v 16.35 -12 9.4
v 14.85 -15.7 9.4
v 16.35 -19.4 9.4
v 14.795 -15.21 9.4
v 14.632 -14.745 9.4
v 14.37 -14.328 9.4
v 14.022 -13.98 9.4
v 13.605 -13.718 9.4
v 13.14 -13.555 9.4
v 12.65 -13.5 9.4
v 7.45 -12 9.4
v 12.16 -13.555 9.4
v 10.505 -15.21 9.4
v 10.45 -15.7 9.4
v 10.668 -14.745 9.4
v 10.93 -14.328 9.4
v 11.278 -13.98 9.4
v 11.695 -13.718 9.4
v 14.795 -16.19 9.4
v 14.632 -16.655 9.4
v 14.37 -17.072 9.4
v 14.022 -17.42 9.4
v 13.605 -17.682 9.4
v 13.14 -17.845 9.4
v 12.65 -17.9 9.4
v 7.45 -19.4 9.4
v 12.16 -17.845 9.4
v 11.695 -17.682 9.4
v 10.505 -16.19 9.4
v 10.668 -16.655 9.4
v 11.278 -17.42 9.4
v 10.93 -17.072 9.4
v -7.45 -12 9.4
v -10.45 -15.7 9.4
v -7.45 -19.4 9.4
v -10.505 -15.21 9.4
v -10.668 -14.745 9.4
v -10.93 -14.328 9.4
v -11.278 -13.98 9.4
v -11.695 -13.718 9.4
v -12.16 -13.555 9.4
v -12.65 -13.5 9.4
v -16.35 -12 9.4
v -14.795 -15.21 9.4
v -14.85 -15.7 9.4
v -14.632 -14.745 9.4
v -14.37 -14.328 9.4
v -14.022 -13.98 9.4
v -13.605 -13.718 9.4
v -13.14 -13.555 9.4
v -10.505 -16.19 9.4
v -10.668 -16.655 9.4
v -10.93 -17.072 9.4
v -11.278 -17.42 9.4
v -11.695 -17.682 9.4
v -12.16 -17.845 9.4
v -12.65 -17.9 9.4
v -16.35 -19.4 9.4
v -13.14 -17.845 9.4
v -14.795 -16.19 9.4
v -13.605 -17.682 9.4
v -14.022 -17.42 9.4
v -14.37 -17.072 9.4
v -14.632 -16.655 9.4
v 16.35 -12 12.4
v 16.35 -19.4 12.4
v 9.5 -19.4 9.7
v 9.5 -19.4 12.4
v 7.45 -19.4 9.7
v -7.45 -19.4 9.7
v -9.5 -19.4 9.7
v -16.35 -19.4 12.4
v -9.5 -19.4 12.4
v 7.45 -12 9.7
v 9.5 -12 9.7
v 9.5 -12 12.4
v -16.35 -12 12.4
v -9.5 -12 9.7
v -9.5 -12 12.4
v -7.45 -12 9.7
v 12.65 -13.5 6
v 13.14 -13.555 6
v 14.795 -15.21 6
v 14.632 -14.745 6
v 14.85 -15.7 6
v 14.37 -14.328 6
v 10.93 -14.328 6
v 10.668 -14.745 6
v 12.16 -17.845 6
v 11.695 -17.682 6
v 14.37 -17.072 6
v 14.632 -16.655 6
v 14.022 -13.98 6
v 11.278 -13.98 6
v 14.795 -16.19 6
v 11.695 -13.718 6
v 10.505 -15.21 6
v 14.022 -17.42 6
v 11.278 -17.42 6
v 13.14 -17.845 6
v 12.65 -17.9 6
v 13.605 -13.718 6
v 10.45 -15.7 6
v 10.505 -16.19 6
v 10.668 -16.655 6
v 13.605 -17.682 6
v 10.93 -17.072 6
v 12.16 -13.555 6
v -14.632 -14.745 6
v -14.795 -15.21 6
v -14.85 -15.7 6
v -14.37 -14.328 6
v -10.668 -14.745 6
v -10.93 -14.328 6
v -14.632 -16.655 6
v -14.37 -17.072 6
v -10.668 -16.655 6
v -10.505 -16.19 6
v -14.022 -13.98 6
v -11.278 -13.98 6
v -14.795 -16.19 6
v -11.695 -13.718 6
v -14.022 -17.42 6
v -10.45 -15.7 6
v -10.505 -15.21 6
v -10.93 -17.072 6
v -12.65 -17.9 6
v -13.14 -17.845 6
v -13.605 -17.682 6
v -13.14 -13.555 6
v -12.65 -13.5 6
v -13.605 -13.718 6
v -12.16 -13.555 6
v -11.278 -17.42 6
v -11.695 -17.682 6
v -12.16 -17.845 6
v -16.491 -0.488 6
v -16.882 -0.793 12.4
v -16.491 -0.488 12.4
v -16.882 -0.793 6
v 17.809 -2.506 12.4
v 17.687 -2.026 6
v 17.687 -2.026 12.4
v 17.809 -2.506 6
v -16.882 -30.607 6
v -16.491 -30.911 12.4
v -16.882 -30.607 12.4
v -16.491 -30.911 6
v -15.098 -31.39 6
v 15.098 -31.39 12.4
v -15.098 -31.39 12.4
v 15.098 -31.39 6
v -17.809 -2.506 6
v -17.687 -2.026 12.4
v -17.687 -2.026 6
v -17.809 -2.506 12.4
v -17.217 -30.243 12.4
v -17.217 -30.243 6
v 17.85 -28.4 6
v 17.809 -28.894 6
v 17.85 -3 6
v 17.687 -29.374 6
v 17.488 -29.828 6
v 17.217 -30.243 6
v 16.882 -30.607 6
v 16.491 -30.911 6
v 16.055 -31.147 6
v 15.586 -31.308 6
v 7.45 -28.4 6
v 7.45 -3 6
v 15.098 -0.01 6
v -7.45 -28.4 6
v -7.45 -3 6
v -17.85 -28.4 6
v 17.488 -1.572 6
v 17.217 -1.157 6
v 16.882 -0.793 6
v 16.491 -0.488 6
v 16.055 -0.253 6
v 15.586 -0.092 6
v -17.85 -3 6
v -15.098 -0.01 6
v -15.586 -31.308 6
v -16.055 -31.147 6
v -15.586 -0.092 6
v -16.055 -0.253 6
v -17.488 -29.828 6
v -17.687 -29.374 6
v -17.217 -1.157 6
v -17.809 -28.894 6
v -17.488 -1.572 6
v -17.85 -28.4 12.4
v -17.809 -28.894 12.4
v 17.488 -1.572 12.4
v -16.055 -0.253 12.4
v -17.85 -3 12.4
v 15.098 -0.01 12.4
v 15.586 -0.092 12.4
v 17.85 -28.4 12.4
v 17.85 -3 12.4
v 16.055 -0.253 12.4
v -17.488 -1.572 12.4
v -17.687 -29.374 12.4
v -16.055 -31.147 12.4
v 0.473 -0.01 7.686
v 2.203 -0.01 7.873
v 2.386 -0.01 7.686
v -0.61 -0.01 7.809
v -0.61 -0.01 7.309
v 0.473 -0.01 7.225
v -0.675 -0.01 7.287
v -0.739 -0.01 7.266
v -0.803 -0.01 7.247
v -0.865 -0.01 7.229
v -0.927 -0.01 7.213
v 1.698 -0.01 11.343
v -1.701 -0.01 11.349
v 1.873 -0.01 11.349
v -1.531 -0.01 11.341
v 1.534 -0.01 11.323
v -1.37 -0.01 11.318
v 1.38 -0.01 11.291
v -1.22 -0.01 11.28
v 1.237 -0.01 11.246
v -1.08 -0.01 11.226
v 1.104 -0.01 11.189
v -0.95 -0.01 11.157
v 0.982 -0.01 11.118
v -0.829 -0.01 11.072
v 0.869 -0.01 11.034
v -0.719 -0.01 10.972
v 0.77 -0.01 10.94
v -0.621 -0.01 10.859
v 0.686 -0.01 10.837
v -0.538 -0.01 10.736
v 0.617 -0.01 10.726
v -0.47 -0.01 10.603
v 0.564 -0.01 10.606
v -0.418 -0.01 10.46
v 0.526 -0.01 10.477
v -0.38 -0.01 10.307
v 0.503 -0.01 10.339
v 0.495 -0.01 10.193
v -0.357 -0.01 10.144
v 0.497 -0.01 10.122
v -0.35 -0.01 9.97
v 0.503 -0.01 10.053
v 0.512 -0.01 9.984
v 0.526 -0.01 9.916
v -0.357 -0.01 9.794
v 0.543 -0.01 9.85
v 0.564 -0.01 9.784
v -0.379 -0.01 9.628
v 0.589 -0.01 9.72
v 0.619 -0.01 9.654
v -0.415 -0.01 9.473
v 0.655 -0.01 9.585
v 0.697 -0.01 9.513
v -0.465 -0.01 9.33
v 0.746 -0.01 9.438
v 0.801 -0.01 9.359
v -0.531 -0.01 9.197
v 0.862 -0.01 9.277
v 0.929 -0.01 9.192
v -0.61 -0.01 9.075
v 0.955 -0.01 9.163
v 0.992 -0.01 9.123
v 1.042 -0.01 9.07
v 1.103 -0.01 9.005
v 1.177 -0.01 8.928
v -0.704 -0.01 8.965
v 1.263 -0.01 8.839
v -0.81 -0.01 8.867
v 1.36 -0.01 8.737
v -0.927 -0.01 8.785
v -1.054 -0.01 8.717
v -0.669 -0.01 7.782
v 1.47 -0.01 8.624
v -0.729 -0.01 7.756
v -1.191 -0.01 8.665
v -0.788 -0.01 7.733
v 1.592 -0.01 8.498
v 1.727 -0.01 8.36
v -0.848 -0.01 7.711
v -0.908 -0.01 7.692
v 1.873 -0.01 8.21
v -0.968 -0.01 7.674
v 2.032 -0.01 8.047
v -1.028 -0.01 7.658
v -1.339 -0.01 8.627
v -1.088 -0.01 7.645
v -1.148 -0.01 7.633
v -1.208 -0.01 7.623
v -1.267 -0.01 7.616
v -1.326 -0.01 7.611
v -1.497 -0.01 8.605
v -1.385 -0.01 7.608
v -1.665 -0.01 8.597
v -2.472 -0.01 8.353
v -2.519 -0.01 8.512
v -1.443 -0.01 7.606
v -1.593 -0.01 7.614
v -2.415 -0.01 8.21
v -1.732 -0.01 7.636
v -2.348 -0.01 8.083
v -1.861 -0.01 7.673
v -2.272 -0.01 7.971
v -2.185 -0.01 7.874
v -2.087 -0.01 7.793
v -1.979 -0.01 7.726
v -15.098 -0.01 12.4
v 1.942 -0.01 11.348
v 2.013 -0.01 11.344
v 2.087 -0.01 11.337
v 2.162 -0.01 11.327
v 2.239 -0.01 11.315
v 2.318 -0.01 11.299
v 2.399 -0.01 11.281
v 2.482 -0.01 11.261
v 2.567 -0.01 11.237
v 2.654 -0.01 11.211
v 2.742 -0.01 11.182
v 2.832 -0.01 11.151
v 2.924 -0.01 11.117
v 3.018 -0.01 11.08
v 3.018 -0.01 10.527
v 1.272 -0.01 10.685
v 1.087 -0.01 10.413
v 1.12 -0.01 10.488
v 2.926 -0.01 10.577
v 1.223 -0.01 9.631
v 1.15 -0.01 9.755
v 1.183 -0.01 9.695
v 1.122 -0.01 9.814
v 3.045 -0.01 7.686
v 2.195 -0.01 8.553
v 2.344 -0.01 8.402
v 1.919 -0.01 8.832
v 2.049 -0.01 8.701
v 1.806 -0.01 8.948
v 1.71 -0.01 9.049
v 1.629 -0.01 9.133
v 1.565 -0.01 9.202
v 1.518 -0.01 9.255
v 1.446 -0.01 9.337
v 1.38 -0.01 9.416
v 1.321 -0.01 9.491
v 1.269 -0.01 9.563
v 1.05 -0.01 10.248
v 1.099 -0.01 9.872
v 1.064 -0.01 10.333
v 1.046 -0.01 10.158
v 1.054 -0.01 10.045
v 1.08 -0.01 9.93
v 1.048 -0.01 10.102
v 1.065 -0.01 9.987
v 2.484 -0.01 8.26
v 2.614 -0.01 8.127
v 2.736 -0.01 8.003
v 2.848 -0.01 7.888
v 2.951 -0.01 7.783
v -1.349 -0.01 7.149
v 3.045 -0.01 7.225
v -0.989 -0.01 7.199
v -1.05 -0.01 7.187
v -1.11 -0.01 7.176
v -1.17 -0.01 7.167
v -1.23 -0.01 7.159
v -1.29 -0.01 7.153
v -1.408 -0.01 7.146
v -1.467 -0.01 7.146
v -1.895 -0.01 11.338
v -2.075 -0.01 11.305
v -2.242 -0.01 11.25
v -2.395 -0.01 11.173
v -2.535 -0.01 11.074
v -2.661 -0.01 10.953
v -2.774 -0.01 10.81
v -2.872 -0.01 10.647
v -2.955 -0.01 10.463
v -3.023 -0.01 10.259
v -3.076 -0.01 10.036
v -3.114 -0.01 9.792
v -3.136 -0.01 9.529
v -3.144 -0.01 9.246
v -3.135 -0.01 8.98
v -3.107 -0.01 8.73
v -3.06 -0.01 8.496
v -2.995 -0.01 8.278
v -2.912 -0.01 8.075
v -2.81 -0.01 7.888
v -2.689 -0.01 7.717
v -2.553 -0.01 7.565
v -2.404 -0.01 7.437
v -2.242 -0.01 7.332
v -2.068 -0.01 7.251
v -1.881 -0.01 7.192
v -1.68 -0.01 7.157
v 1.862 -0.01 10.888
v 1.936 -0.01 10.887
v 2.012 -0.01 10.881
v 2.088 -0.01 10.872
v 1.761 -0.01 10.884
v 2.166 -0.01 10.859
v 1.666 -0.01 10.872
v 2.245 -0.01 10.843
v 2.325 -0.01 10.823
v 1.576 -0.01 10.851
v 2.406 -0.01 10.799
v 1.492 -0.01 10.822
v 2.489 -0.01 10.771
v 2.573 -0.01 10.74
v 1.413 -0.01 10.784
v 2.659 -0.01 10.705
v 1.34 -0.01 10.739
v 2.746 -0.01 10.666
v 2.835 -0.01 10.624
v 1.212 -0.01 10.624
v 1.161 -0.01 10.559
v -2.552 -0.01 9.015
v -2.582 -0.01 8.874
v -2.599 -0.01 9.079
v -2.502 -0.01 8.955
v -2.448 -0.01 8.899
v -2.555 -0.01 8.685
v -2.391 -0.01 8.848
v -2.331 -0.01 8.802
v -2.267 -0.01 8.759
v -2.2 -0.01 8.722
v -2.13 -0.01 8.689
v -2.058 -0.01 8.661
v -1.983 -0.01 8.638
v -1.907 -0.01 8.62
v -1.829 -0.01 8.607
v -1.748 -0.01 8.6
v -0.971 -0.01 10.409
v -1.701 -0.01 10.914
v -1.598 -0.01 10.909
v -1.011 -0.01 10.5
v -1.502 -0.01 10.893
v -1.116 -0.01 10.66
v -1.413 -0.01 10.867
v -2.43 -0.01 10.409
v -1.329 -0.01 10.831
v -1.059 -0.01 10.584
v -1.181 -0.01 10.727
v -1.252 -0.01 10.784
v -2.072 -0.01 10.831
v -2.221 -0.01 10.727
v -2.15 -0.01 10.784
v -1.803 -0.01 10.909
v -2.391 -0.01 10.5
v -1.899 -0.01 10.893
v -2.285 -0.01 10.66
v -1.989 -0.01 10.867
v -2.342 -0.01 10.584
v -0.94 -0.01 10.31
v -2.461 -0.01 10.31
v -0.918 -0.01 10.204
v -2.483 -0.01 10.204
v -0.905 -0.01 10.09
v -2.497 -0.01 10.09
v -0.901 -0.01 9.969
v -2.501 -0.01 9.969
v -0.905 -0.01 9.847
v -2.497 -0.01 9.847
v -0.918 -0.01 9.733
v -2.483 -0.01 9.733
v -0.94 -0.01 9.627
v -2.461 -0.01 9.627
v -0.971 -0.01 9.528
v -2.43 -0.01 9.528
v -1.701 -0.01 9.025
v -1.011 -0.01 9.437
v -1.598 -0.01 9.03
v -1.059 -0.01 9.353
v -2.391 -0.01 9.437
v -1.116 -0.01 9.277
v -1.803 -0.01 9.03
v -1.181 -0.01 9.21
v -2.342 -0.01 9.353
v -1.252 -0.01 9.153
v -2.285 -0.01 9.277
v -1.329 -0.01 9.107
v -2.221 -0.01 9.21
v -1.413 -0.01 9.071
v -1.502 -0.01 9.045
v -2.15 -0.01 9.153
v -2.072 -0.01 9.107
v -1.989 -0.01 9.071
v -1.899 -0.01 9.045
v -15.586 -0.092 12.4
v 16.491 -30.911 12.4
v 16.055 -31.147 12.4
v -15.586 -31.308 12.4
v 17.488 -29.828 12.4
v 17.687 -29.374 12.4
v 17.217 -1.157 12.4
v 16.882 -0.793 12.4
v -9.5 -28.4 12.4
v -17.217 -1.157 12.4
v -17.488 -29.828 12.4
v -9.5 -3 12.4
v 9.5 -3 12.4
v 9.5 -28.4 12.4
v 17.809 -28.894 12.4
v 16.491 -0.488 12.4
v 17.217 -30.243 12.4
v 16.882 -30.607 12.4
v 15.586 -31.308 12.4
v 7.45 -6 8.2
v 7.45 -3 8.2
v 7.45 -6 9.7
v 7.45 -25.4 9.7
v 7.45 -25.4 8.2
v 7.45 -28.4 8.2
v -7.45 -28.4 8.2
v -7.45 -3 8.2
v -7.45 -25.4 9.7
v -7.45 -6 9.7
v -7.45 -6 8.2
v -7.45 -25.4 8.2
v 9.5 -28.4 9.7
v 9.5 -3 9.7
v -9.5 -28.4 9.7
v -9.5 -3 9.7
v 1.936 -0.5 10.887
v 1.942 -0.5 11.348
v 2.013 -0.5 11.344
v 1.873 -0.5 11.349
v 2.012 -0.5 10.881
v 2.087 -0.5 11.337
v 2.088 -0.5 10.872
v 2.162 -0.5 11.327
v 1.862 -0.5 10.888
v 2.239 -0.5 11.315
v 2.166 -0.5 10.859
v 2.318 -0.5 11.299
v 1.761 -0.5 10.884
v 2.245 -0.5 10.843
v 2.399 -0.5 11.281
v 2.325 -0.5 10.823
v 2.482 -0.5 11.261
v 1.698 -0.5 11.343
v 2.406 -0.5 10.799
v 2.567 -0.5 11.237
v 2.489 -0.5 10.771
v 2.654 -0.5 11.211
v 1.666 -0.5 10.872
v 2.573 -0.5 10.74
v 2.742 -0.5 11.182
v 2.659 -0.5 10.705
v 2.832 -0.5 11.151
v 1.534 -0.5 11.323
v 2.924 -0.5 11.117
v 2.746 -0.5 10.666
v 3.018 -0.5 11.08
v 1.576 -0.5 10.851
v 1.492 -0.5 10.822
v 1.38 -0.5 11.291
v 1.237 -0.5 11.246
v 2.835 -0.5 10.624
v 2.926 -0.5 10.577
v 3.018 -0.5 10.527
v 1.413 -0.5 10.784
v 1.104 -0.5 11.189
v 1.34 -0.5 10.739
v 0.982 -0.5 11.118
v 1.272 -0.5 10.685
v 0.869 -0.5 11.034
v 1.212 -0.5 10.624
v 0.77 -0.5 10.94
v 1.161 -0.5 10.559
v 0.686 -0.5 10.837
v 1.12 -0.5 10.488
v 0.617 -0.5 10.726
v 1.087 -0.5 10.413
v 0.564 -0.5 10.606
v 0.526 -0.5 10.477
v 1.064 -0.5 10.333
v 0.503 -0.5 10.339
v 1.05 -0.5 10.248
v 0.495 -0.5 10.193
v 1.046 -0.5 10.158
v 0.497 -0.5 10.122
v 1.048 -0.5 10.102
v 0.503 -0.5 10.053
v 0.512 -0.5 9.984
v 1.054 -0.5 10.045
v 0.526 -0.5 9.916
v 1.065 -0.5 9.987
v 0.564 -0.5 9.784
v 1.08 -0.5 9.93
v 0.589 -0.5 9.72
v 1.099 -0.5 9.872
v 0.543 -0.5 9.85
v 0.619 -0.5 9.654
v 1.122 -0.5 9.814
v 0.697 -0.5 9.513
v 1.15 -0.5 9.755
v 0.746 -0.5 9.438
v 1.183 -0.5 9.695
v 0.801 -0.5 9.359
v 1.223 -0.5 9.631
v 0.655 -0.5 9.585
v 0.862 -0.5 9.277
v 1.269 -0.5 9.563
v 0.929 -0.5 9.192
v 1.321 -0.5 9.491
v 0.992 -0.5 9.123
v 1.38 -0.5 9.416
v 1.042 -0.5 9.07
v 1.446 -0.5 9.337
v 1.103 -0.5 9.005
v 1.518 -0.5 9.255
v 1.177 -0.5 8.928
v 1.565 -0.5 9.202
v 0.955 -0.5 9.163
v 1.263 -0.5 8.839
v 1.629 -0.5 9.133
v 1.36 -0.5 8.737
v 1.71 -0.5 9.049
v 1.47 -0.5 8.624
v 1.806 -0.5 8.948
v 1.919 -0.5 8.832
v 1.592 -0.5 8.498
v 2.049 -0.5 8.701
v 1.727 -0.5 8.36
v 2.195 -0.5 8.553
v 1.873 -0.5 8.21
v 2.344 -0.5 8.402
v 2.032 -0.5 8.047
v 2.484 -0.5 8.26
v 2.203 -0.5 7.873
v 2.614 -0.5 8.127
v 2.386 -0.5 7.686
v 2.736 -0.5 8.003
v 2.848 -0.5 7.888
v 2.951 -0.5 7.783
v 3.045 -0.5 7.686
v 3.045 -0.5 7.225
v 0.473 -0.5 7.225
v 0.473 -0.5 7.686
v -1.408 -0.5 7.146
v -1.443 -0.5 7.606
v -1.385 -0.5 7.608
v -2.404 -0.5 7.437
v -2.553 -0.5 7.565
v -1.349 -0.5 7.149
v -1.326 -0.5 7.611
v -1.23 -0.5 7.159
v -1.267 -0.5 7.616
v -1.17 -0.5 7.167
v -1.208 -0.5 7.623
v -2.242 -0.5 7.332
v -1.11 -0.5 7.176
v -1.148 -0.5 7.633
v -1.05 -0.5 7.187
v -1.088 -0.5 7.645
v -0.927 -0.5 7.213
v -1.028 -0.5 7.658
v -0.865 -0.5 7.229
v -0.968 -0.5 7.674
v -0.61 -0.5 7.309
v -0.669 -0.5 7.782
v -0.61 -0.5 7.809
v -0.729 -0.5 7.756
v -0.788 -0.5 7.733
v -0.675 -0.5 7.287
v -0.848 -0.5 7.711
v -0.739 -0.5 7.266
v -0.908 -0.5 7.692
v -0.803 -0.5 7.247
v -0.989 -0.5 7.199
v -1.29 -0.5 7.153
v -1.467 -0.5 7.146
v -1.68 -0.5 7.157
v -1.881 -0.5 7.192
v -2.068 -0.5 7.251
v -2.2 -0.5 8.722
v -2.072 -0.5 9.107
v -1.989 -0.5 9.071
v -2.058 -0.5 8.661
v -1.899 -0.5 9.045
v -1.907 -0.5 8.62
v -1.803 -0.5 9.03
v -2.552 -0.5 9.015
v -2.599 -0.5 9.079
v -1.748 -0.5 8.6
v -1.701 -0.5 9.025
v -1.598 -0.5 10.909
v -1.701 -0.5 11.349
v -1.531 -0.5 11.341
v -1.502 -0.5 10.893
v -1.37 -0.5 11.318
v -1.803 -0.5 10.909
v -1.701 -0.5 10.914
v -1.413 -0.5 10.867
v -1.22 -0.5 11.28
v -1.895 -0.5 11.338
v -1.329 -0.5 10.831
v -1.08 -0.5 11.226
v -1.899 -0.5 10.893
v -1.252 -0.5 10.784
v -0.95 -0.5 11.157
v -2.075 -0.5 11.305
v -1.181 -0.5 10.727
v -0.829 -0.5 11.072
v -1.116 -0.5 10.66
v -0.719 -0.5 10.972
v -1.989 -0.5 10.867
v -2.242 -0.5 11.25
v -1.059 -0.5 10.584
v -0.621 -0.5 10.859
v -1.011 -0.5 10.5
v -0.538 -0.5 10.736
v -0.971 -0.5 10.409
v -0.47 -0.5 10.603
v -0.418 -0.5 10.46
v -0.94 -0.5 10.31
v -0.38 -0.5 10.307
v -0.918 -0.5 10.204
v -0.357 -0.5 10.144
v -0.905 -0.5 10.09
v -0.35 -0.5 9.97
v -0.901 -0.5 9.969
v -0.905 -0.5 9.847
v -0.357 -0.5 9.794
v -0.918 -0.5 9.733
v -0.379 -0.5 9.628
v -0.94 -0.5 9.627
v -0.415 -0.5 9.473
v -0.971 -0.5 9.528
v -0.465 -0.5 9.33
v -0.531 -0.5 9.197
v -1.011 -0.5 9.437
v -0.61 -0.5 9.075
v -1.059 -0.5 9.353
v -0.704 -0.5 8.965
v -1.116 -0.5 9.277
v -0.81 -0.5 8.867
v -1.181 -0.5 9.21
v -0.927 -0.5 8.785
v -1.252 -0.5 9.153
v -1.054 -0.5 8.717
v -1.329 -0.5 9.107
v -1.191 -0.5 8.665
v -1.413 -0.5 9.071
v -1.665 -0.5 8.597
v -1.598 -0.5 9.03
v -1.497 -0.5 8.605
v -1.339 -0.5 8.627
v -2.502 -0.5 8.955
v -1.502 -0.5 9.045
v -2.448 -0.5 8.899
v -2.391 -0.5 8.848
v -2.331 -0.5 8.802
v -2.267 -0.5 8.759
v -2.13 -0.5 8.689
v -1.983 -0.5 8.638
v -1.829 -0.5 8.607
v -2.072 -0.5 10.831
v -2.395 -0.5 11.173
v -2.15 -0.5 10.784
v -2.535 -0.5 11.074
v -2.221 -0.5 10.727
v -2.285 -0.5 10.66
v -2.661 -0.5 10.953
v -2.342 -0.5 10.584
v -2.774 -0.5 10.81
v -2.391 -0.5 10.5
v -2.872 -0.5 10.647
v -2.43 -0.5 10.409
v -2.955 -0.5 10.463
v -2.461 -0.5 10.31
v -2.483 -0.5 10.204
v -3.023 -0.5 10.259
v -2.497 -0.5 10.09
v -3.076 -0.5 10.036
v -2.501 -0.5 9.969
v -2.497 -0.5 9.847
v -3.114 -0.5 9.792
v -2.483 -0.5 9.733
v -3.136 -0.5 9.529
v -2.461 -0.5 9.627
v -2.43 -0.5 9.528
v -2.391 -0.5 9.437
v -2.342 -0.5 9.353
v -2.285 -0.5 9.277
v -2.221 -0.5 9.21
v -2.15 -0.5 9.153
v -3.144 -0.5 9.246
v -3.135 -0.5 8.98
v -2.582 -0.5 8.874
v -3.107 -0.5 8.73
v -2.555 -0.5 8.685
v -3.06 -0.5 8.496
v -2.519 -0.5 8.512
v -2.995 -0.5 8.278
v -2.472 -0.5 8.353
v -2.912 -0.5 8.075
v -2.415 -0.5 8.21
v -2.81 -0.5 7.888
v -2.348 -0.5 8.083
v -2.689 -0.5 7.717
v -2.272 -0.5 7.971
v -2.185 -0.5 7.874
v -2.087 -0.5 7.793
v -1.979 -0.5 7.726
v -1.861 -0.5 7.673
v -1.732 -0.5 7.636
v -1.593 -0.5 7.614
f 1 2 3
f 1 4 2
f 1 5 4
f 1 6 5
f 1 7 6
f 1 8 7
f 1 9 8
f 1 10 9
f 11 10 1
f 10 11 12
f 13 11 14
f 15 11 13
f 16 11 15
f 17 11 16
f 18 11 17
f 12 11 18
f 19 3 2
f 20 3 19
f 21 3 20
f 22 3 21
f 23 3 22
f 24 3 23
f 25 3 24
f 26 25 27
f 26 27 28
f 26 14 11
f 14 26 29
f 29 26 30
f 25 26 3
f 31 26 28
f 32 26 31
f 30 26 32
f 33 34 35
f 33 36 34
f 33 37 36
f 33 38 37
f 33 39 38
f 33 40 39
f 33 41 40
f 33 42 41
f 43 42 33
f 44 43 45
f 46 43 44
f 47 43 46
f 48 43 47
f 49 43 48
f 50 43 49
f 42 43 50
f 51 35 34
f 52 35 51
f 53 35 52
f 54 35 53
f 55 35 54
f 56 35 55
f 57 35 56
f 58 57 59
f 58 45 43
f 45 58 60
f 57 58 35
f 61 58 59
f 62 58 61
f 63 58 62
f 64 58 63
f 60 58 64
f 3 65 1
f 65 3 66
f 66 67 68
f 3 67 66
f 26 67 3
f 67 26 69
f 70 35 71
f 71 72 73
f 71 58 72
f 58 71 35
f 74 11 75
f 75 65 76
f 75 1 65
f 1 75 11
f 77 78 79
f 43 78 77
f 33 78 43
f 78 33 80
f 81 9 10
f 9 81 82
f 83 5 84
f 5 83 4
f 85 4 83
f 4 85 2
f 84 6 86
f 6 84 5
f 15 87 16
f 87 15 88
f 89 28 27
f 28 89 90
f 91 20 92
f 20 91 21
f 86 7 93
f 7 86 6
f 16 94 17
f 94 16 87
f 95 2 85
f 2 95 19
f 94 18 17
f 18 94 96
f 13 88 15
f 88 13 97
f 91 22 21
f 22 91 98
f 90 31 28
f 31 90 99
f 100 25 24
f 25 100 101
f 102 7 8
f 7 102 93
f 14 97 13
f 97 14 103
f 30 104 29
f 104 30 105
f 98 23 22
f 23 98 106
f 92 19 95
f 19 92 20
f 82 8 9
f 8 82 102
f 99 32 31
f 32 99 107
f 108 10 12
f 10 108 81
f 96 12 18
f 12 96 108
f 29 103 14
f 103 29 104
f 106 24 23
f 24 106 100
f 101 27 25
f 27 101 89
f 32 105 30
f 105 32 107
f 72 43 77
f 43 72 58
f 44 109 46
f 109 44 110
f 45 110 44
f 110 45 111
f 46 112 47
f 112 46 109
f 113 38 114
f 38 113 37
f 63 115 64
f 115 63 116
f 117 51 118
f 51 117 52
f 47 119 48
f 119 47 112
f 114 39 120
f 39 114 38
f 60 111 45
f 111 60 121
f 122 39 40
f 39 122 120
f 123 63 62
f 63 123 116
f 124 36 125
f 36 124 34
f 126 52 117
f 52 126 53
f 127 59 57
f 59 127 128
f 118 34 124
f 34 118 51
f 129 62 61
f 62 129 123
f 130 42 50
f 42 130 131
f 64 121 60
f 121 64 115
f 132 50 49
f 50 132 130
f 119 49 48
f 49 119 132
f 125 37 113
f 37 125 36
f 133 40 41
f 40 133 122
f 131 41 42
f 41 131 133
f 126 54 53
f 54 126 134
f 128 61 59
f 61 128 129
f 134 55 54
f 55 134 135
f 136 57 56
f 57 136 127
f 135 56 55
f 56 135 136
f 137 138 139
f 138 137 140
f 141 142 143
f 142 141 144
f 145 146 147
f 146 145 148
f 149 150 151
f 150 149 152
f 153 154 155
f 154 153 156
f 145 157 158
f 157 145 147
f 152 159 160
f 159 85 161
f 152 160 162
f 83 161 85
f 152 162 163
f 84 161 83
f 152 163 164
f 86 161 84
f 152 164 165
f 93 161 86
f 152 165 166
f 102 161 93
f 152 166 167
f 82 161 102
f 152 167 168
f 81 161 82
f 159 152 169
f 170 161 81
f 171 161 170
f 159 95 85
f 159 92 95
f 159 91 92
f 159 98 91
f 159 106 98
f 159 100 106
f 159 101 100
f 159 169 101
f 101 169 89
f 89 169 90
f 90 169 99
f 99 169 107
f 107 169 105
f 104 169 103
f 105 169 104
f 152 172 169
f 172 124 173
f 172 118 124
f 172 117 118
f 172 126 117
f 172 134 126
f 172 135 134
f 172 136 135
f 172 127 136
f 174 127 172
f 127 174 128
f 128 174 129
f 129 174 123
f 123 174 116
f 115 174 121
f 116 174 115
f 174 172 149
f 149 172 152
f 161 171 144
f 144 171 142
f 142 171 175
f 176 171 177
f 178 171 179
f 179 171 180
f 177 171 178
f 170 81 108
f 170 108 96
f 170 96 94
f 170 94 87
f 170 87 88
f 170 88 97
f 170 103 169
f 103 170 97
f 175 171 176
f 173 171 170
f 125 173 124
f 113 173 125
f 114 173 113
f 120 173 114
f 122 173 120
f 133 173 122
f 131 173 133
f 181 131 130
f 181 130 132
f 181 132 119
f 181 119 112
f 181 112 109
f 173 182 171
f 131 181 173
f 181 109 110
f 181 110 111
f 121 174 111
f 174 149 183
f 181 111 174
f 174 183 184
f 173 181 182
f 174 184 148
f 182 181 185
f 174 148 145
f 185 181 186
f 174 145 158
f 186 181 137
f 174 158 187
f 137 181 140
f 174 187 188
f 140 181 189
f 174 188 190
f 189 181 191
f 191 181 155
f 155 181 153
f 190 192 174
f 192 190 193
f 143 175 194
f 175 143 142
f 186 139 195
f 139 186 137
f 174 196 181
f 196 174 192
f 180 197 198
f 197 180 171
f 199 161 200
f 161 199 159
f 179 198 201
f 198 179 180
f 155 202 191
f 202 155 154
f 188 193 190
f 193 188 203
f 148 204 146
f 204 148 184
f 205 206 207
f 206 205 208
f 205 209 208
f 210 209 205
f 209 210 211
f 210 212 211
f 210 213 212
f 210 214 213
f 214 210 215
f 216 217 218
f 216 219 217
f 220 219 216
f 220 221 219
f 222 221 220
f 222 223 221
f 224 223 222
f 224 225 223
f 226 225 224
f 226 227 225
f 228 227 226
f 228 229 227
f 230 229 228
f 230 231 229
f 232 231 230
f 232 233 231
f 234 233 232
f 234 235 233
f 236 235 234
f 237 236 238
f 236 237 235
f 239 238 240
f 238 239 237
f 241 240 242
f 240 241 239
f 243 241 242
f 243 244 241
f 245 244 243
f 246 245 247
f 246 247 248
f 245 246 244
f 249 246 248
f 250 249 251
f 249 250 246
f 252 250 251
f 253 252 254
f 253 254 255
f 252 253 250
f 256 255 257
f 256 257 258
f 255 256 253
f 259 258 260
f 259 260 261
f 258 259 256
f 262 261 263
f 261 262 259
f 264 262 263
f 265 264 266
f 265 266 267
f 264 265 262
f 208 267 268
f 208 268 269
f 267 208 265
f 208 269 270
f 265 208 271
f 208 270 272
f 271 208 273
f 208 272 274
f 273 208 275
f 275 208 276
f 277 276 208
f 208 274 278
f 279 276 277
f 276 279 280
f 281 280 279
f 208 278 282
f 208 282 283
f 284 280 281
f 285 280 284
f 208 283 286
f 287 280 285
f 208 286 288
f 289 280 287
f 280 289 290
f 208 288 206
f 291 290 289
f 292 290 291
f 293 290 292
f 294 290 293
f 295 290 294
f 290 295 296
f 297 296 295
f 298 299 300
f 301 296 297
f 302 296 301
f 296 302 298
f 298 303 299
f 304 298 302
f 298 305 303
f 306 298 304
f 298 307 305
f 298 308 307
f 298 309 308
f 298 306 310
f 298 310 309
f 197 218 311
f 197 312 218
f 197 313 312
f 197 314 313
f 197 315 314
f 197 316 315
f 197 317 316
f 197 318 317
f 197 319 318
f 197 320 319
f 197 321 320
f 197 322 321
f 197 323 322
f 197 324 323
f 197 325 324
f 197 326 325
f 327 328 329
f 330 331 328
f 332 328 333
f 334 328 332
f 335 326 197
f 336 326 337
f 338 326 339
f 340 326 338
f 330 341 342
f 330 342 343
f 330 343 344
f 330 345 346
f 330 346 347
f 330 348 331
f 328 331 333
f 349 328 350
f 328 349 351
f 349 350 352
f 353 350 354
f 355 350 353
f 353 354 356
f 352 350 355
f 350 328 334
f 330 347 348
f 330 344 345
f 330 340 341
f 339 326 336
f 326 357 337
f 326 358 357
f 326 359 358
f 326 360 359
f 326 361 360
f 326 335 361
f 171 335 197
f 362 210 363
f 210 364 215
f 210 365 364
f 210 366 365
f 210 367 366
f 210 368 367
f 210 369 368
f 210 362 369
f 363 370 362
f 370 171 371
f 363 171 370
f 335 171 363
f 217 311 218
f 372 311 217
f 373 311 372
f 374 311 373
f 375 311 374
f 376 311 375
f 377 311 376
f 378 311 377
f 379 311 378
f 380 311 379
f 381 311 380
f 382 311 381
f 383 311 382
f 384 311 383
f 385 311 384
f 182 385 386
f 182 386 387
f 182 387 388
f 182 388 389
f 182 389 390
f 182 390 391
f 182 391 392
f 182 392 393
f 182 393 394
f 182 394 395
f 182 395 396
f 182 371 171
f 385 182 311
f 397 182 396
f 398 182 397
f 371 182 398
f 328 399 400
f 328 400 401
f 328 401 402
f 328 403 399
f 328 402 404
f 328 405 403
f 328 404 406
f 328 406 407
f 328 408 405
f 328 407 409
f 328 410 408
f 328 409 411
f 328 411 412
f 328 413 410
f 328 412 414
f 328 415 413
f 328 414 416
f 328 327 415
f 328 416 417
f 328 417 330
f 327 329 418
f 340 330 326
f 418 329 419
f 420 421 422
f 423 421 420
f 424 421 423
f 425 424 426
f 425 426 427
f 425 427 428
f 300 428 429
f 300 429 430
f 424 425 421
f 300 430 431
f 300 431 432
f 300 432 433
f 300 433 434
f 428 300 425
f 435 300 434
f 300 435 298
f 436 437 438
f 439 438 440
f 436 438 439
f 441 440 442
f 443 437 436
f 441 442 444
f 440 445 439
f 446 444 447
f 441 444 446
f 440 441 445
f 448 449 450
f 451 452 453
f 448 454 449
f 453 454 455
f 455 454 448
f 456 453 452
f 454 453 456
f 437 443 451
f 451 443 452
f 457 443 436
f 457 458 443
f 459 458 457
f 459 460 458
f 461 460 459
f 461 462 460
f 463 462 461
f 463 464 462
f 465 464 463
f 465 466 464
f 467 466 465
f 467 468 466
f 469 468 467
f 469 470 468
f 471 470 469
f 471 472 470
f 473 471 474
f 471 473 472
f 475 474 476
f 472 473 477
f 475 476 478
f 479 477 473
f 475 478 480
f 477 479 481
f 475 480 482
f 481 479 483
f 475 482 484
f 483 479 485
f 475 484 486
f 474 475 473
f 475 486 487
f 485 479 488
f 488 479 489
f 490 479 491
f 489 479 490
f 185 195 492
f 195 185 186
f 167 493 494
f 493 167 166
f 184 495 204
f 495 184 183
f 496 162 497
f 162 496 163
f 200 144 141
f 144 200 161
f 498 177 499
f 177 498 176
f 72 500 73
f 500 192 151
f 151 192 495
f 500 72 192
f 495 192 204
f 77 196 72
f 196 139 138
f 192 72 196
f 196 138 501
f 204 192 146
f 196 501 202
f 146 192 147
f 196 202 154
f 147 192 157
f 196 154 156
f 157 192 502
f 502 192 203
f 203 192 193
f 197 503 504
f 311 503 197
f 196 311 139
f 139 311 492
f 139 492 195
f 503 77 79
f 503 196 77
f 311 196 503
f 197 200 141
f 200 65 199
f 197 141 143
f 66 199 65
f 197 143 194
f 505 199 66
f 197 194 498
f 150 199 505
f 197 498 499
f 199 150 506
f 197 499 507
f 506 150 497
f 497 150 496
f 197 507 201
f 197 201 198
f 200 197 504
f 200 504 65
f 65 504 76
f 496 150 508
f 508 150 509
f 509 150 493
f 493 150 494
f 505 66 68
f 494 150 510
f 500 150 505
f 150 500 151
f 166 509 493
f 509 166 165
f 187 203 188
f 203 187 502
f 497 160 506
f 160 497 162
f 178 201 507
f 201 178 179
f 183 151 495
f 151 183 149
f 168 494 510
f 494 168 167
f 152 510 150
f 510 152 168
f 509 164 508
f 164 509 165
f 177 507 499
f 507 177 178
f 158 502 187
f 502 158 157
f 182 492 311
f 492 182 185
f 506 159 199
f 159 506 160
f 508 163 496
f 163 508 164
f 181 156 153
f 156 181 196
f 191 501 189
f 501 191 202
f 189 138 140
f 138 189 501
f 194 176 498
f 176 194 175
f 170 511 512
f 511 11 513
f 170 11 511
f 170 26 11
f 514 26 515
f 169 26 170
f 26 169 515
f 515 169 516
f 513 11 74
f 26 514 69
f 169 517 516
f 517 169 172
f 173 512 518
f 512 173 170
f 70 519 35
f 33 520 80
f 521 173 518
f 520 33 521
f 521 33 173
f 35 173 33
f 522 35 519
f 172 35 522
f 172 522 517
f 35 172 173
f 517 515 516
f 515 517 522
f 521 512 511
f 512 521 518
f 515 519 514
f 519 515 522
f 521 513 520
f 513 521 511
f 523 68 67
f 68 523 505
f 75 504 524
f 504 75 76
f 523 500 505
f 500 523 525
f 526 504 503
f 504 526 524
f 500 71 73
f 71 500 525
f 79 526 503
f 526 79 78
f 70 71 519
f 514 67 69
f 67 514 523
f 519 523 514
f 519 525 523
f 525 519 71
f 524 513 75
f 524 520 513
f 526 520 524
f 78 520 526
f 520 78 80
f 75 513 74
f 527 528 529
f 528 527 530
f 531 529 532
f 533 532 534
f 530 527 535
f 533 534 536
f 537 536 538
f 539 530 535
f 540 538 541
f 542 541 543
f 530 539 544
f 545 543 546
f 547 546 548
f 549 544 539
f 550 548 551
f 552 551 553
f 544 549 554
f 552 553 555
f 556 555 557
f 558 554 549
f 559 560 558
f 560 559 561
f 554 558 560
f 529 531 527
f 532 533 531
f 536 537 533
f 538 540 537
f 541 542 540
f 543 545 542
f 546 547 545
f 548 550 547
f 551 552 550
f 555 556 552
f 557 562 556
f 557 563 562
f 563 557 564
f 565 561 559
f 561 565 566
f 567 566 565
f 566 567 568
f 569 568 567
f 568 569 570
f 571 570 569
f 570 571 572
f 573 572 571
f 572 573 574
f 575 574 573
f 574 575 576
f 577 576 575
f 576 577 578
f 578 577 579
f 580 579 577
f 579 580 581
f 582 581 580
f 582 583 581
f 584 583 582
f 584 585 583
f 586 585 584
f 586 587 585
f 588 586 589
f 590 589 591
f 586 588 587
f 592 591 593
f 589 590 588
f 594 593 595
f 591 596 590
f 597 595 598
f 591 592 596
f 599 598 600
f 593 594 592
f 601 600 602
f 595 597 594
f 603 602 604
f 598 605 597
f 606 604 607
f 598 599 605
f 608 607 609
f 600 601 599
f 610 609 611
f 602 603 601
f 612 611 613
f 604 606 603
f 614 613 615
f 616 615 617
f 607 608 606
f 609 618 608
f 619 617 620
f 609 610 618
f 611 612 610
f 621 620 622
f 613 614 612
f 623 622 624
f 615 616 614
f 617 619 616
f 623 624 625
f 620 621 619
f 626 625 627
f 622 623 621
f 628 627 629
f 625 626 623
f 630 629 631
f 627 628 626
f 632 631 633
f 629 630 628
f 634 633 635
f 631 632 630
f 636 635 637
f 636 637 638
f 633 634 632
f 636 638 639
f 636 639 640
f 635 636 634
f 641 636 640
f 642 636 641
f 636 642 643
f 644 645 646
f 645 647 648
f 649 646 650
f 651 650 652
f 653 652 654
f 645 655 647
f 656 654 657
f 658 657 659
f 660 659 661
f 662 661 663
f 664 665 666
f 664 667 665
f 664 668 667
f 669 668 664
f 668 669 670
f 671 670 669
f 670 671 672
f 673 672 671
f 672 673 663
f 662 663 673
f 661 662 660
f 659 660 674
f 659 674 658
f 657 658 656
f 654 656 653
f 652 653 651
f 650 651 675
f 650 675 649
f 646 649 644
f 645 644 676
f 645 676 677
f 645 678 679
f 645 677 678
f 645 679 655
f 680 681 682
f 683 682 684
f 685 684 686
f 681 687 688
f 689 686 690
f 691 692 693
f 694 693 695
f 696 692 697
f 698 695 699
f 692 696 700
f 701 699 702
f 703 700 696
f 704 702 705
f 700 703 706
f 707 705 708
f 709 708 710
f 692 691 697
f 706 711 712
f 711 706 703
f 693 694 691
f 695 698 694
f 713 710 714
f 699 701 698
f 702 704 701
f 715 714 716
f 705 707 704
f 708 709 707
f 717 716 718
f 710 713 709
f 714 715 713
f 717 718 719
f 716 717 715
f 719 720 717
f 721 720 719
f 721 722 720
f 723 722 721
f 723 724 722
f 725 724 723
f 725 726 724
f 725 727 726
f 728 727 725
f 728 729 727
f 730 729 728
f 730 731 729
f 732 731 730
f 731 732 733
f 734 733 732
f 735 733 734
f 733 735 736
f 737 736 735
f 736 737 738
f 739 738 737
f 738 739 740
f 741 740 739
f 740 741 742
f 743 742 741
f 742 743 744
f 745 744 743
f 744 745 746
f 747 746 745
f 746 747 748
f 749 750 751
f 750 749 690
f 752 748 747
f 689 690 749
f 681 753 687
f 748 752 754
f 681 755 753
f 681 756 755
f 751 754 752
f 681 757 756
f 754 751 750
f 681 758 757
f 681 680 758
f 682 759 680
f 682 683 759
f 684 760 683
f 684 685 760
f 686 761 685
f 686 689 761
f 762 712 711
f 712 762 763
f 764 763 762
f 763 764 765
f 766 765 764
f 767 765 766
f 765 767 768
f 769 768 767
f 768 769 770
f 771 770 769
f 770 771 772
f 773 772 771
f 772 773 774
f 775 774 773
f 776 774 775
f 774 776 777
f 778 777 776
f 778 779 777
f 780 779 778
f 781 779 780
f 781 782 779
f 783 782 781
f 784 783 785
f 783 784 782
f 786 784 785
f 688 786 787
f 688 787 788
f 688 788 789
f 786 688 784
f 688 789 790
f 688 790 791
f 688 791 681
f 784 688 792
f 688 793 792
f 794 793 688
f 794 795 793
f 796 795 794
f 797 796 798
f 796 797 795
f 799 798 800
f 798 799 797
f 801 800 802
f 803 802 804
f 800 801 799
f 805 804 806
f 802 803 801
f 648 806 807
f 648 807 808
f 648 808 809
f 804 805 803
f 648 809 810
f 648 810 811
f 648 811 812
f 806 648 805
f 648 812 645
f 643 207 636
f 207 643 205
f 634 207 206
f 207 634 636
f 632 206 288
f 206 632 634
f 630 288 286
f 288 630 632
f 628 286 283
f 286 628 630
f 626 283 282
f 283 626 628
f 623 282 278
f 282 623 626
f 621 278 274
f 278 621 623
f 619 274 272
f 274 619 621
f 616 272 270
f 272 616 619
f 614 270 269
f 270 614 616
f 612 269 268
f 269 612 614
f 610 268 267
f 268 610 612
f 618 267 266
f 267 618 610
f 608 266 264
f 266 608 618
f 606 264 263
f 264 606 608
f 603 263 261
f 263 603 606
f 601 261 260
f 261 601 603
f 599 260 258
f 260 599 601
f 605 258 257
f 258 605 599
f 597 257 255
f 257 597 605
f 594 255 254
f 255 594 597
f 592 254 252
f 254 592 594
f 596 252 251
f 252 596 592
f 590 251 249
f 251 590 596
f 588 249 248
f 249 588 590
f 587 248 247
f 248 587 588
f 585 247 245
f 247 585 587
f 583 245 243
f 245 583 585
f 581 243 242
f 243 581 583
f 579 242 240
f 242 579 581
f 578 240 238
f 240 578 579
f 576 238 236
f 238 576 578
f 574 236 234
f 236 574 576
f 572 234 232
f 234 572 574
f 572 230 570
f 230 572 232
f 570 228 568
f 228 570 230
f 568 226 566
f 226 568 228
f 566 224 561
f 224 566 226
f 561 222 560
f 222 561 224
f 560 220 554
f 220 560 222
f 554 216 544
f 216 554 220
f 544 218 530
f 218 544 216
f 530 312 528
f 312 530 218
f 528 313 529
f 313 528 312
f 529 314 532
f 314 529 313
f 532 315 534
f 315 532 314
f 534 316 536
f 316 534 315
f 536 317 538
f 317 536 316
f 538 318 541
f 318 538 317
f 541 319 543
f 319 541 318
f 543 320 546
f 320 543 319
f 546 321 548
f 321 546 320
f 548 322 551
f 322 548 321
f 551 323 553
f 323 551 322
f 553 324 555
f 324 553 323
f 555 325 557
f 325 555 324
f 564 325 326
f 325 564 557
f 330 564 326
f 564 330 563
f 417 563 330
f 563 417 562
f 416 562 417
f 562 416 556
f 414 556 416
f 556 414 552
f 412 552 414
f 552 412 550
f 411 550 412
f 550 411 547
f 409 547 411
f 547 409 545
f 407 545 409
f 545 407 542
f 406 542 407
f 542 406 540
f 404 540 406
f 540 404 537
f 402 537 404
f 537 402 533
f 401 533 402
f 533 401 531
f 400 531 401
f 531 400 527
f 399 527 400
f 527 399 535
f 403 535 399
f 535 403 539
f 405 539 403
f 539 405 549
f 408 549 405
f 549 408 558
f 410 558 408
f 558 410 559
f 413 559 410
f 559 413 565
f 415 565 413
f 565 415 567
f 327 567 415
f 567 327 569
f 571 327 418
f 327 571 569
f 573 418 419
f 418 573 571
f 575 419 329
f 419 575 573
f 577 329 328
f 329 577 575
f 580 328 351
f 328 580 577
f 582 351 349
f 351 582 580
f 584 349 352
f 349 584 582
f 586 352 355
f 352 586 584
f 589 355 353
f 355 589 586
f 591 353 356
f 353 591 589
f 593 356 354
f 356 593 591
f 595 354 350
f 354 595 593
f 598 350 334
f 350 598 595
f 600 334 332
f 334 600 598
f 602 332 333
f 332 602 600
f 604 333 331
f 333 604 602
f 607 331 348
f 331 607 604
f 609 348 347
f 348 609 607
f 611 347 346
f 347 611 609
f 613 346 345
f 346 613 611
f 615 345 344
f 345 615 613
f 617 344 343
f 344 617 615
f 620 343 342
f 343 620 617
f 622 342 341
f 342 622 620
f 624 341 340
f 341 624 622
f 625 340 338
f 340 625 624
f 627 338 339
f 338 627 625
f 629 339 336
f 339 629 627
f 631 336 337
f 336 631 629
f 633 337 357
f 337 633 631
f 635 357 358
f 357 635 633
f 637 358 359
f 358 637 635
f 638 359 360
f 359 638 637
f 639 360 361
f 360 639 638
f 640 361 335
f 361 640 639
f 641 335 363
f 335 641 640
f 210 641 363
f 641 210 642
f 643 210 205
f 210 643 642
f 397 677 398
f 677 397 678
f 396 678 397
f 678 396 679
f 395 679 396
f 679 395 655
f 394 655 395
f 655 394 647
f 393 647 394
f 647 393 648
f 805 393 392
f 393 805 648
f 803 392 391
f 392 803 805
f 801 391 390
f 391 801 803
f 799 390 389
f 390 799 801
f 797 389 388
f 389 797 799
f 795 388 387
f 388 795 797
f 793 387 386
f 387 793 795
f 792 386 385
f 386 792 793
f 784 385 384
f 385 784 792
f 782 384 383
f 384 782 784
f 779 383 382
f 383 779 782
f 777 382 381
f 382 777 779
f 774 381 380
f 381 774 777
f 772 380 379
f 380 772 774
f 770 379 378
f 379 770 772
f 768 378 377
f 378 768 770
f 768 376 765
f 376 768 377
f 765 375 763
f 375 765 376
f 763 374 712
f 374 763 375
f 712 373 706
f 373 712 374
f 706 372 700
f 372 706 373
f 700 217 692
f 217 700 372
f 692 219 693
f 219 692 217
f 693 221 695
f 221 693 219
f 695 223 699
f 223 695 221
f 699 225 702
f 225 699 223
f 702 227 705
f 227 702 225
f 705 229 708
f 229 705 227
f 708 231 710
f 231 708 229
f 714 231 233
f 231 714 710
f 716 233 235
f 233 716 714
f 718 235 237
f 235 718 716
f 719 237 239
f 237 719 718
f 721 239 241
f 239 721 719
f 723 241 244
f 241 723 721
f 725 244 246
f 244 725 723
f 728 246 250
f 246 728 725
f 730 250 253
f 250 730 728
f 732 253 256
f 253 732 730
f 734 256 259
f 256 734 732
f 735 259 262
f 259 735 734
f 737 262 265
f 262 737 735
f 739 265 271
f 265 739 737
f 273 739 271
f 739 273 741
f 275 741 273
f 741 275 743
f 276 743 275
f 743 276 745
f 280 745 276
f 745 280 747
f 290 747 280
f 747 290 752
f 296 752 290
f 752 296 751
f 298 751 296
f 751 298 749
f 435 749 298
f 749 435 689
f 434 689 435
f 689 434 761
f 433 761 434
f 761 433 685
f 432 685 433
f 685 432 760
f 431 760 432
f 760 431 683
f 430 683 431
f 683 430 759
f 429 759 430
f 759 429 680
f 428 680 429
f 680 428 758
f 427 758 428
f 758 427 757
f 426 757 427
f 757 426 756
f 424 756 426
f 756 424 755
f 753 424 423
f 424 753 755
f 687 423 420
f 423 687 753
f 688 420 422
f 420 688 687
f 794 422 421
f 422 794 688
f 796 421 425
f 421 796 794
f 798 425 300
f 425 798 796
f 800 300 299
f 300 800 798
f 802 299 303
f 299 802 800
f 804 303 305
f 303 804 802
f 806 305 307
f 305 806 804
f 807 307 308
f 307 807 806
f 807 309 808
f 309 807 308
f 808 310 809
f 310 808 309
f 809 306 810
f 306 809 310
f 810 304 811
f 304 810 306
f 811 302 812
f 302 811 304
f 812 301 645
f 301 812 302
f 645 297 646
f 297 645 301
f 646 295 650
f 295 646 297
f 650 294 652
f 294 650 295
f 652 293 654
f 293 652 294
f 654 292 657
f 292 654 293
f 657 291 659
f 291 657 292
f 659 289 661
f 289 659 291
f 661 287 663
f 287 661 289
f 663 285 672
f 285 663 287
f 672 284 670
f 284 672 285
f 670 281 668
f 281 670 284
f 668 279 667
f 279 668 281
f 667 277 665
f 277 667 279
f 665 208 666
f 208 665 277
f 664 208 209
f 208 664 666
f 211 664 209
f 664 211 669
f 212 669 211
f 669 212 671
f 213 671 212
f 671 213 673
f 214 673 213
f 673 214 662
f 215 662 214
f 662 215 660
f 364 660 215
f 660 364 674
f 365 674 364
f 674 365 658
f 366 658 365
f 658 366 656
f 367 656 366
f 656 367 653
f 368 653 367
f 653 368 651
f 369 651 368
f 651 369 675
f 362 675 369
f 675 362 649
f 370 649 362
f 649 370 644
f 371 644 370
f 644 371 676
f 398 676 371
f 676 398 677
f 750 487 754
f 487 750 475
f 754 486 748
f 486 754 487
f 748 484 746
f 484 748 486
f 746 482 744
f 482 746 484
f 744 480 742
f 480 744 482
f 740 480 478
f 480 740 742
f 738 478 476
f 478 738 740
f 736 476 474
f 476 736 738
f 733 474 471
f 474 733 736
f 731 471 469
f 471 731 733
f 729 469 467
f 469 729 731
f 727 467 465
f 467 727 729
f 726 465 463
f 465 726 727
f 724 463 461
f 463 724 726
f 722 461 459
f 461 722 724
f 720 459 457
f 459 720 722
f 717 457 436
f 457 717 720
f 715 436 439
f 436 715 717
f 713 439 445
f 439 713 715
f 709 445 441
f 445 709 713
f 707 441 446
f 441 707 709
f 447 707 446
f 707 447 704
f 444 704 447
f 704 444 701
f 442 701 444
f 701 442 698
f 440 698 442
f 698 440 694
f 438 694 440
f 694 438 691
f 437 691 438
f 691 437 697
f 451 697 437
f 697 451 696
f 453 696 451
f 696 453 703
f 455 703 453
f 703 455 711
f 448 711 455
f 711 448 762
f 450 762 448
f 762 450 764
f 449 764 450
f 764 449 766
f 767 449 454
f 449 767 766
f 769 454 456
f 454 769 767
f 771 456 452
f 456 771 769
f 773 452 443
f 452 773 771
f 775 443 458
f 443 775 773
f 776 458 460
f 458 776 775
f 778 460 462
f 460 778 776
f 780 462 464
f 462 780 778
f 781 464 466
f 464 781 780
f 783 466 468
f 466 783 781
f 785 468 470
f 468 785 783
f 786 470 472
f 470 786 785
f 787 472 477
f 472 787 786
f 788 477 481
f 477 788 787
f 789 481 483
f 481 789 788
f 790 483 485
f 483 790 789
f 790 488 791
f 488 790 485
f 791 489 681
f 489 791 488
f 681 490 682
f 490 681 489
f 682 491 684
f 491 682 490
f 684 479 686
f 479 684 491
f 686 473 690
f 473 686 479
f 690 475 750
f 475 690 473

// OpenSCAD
/*******************************************************************

This OpenSCAD code and its rendered 3D model are part of the

	Kühling&Kühling RepRap Industrial 3D Printer


All details, BOM, assembling instructions and latest sources:
	http://kuehlingkuehling.de

Designed and developed by:
	Jonas Kühling <mail@jonaskuehling.de>
	Simon Kühling <mail@simonkuehling.de>

License:
	Creative Commons Attribution-ShareAlike 4.0 International (CC BY-SA 4.0)
	https://creativecommons.org/licenses/by-sa/4.0/

*******************************************************************/

include <configuration.scad>





// RENDERING
rotate([90,0,0])
    difference(){
        controller_ethernet_coupling_panel();
        translate([0,frame_enclosure_thickness+controller_ethernet_coupling_panel_body_length/2,0])
            label("29",orientation="bottom");
    }




module controller_ethernet_coupling_panel(){
	difference(){

		// main body
		hull(){
			translate([-controller_ethernet_coupling_panel_body_width/2+wall,frame_enclosure_thickness,wall])
				rotate([-90,0,0])
					cylinder(r=wall,h=controller_ethernet_coupling_panel_body_length);
			translate([controller_ethernet_coupling_panel_body_width/2-wall,frame_enclosure_thickness,wall])
				rotate([-90,0,0])
					cylinder(r=wall,h=controller_ethernet_coupling_panel_body_length);
			translate([-controller_ethernet_coupling_panel_body_width/2+wall,frame_enclosure_thickness,controller_ethernet_coupling_panel_body_height-wall])
				rotate([-90,0,0])
					cylinder(r=wall,h=controller_ethernet_coupling_panel_body_length);
			translate([controller_ethernet_coupling_panel_body_width/2-wall,frame_enclosure_thickness,controller_ethernet_coupling_panel_body_height-wall])
				rotate([-90,0,0])
					cylinder(r=wall,h=controller_ethernet_coupling_panel_body_length);
		}

		// controller ethernet coupling mount
		translate([-controller_ethernet_coupling_width_front/2-clearance,0,wall])
			cube([controller_ethernet_coupling_width_front+2*clearance,controller_ethernet_coupling_panel_front_dist,controller_ethernet_coupling_panel_body_height-2*wall]);
		translate([-controller_ethernet_coupling_width_front/2-clearance,0,2*wall])
			cube([controller_ethernet_coupling_width_front+2*clearance,frame_enclosure_thickness+controller_ethernet_coupling_panel_body_length+1,controller_ethernet_coupling_height_back+2*clearance]);
		translate([-controller_ethernet_coupling_width_back/2-clearance,controller_ethernet_coupling_panel_front_dist+controller_ethernet_coupling_panel_thickness,wall])
			cube([controller_ethernet_coupling_width_back+2*clearance,controller_ethernet_coupling_panel_front_dist,controller_ethernet_coupling_panel_body_height-2*wall]);

		// frame enclosure mount screw holes and nut traps
		for(i=[0,1])
			mirror([i,0,0]){
				translate([controller_ethernet_coupling_panel_body_width/2-wall-clearance-frame_screw_dia/2,0,controller_ethernet_coupling_panel_body_height/2])
					rotate([-90,0,0])
						cylinder(r=frame_screw_dia/2+clearance,h=frame_enclosure_thickness+controller_ethernet_coupling_panel_body_length+1);
				translate([controller_ethernet_coupling_panel_body_width/2-wall-clearance-frame_screw_dia/2,(frame_screw_nut_height+clearance+1)/2+frame_enclosure_thickness+wall,controller_ethernet_coupling_panel_body_height/2])
					rotate([0,180,0])
						rotate([-90,0,0])
							nut_slot_square(frame_screw_nut_wrench,frame_screw_nut_height,controller_ethernet_coupling_panel_body_width/2);
			}
	}
}
